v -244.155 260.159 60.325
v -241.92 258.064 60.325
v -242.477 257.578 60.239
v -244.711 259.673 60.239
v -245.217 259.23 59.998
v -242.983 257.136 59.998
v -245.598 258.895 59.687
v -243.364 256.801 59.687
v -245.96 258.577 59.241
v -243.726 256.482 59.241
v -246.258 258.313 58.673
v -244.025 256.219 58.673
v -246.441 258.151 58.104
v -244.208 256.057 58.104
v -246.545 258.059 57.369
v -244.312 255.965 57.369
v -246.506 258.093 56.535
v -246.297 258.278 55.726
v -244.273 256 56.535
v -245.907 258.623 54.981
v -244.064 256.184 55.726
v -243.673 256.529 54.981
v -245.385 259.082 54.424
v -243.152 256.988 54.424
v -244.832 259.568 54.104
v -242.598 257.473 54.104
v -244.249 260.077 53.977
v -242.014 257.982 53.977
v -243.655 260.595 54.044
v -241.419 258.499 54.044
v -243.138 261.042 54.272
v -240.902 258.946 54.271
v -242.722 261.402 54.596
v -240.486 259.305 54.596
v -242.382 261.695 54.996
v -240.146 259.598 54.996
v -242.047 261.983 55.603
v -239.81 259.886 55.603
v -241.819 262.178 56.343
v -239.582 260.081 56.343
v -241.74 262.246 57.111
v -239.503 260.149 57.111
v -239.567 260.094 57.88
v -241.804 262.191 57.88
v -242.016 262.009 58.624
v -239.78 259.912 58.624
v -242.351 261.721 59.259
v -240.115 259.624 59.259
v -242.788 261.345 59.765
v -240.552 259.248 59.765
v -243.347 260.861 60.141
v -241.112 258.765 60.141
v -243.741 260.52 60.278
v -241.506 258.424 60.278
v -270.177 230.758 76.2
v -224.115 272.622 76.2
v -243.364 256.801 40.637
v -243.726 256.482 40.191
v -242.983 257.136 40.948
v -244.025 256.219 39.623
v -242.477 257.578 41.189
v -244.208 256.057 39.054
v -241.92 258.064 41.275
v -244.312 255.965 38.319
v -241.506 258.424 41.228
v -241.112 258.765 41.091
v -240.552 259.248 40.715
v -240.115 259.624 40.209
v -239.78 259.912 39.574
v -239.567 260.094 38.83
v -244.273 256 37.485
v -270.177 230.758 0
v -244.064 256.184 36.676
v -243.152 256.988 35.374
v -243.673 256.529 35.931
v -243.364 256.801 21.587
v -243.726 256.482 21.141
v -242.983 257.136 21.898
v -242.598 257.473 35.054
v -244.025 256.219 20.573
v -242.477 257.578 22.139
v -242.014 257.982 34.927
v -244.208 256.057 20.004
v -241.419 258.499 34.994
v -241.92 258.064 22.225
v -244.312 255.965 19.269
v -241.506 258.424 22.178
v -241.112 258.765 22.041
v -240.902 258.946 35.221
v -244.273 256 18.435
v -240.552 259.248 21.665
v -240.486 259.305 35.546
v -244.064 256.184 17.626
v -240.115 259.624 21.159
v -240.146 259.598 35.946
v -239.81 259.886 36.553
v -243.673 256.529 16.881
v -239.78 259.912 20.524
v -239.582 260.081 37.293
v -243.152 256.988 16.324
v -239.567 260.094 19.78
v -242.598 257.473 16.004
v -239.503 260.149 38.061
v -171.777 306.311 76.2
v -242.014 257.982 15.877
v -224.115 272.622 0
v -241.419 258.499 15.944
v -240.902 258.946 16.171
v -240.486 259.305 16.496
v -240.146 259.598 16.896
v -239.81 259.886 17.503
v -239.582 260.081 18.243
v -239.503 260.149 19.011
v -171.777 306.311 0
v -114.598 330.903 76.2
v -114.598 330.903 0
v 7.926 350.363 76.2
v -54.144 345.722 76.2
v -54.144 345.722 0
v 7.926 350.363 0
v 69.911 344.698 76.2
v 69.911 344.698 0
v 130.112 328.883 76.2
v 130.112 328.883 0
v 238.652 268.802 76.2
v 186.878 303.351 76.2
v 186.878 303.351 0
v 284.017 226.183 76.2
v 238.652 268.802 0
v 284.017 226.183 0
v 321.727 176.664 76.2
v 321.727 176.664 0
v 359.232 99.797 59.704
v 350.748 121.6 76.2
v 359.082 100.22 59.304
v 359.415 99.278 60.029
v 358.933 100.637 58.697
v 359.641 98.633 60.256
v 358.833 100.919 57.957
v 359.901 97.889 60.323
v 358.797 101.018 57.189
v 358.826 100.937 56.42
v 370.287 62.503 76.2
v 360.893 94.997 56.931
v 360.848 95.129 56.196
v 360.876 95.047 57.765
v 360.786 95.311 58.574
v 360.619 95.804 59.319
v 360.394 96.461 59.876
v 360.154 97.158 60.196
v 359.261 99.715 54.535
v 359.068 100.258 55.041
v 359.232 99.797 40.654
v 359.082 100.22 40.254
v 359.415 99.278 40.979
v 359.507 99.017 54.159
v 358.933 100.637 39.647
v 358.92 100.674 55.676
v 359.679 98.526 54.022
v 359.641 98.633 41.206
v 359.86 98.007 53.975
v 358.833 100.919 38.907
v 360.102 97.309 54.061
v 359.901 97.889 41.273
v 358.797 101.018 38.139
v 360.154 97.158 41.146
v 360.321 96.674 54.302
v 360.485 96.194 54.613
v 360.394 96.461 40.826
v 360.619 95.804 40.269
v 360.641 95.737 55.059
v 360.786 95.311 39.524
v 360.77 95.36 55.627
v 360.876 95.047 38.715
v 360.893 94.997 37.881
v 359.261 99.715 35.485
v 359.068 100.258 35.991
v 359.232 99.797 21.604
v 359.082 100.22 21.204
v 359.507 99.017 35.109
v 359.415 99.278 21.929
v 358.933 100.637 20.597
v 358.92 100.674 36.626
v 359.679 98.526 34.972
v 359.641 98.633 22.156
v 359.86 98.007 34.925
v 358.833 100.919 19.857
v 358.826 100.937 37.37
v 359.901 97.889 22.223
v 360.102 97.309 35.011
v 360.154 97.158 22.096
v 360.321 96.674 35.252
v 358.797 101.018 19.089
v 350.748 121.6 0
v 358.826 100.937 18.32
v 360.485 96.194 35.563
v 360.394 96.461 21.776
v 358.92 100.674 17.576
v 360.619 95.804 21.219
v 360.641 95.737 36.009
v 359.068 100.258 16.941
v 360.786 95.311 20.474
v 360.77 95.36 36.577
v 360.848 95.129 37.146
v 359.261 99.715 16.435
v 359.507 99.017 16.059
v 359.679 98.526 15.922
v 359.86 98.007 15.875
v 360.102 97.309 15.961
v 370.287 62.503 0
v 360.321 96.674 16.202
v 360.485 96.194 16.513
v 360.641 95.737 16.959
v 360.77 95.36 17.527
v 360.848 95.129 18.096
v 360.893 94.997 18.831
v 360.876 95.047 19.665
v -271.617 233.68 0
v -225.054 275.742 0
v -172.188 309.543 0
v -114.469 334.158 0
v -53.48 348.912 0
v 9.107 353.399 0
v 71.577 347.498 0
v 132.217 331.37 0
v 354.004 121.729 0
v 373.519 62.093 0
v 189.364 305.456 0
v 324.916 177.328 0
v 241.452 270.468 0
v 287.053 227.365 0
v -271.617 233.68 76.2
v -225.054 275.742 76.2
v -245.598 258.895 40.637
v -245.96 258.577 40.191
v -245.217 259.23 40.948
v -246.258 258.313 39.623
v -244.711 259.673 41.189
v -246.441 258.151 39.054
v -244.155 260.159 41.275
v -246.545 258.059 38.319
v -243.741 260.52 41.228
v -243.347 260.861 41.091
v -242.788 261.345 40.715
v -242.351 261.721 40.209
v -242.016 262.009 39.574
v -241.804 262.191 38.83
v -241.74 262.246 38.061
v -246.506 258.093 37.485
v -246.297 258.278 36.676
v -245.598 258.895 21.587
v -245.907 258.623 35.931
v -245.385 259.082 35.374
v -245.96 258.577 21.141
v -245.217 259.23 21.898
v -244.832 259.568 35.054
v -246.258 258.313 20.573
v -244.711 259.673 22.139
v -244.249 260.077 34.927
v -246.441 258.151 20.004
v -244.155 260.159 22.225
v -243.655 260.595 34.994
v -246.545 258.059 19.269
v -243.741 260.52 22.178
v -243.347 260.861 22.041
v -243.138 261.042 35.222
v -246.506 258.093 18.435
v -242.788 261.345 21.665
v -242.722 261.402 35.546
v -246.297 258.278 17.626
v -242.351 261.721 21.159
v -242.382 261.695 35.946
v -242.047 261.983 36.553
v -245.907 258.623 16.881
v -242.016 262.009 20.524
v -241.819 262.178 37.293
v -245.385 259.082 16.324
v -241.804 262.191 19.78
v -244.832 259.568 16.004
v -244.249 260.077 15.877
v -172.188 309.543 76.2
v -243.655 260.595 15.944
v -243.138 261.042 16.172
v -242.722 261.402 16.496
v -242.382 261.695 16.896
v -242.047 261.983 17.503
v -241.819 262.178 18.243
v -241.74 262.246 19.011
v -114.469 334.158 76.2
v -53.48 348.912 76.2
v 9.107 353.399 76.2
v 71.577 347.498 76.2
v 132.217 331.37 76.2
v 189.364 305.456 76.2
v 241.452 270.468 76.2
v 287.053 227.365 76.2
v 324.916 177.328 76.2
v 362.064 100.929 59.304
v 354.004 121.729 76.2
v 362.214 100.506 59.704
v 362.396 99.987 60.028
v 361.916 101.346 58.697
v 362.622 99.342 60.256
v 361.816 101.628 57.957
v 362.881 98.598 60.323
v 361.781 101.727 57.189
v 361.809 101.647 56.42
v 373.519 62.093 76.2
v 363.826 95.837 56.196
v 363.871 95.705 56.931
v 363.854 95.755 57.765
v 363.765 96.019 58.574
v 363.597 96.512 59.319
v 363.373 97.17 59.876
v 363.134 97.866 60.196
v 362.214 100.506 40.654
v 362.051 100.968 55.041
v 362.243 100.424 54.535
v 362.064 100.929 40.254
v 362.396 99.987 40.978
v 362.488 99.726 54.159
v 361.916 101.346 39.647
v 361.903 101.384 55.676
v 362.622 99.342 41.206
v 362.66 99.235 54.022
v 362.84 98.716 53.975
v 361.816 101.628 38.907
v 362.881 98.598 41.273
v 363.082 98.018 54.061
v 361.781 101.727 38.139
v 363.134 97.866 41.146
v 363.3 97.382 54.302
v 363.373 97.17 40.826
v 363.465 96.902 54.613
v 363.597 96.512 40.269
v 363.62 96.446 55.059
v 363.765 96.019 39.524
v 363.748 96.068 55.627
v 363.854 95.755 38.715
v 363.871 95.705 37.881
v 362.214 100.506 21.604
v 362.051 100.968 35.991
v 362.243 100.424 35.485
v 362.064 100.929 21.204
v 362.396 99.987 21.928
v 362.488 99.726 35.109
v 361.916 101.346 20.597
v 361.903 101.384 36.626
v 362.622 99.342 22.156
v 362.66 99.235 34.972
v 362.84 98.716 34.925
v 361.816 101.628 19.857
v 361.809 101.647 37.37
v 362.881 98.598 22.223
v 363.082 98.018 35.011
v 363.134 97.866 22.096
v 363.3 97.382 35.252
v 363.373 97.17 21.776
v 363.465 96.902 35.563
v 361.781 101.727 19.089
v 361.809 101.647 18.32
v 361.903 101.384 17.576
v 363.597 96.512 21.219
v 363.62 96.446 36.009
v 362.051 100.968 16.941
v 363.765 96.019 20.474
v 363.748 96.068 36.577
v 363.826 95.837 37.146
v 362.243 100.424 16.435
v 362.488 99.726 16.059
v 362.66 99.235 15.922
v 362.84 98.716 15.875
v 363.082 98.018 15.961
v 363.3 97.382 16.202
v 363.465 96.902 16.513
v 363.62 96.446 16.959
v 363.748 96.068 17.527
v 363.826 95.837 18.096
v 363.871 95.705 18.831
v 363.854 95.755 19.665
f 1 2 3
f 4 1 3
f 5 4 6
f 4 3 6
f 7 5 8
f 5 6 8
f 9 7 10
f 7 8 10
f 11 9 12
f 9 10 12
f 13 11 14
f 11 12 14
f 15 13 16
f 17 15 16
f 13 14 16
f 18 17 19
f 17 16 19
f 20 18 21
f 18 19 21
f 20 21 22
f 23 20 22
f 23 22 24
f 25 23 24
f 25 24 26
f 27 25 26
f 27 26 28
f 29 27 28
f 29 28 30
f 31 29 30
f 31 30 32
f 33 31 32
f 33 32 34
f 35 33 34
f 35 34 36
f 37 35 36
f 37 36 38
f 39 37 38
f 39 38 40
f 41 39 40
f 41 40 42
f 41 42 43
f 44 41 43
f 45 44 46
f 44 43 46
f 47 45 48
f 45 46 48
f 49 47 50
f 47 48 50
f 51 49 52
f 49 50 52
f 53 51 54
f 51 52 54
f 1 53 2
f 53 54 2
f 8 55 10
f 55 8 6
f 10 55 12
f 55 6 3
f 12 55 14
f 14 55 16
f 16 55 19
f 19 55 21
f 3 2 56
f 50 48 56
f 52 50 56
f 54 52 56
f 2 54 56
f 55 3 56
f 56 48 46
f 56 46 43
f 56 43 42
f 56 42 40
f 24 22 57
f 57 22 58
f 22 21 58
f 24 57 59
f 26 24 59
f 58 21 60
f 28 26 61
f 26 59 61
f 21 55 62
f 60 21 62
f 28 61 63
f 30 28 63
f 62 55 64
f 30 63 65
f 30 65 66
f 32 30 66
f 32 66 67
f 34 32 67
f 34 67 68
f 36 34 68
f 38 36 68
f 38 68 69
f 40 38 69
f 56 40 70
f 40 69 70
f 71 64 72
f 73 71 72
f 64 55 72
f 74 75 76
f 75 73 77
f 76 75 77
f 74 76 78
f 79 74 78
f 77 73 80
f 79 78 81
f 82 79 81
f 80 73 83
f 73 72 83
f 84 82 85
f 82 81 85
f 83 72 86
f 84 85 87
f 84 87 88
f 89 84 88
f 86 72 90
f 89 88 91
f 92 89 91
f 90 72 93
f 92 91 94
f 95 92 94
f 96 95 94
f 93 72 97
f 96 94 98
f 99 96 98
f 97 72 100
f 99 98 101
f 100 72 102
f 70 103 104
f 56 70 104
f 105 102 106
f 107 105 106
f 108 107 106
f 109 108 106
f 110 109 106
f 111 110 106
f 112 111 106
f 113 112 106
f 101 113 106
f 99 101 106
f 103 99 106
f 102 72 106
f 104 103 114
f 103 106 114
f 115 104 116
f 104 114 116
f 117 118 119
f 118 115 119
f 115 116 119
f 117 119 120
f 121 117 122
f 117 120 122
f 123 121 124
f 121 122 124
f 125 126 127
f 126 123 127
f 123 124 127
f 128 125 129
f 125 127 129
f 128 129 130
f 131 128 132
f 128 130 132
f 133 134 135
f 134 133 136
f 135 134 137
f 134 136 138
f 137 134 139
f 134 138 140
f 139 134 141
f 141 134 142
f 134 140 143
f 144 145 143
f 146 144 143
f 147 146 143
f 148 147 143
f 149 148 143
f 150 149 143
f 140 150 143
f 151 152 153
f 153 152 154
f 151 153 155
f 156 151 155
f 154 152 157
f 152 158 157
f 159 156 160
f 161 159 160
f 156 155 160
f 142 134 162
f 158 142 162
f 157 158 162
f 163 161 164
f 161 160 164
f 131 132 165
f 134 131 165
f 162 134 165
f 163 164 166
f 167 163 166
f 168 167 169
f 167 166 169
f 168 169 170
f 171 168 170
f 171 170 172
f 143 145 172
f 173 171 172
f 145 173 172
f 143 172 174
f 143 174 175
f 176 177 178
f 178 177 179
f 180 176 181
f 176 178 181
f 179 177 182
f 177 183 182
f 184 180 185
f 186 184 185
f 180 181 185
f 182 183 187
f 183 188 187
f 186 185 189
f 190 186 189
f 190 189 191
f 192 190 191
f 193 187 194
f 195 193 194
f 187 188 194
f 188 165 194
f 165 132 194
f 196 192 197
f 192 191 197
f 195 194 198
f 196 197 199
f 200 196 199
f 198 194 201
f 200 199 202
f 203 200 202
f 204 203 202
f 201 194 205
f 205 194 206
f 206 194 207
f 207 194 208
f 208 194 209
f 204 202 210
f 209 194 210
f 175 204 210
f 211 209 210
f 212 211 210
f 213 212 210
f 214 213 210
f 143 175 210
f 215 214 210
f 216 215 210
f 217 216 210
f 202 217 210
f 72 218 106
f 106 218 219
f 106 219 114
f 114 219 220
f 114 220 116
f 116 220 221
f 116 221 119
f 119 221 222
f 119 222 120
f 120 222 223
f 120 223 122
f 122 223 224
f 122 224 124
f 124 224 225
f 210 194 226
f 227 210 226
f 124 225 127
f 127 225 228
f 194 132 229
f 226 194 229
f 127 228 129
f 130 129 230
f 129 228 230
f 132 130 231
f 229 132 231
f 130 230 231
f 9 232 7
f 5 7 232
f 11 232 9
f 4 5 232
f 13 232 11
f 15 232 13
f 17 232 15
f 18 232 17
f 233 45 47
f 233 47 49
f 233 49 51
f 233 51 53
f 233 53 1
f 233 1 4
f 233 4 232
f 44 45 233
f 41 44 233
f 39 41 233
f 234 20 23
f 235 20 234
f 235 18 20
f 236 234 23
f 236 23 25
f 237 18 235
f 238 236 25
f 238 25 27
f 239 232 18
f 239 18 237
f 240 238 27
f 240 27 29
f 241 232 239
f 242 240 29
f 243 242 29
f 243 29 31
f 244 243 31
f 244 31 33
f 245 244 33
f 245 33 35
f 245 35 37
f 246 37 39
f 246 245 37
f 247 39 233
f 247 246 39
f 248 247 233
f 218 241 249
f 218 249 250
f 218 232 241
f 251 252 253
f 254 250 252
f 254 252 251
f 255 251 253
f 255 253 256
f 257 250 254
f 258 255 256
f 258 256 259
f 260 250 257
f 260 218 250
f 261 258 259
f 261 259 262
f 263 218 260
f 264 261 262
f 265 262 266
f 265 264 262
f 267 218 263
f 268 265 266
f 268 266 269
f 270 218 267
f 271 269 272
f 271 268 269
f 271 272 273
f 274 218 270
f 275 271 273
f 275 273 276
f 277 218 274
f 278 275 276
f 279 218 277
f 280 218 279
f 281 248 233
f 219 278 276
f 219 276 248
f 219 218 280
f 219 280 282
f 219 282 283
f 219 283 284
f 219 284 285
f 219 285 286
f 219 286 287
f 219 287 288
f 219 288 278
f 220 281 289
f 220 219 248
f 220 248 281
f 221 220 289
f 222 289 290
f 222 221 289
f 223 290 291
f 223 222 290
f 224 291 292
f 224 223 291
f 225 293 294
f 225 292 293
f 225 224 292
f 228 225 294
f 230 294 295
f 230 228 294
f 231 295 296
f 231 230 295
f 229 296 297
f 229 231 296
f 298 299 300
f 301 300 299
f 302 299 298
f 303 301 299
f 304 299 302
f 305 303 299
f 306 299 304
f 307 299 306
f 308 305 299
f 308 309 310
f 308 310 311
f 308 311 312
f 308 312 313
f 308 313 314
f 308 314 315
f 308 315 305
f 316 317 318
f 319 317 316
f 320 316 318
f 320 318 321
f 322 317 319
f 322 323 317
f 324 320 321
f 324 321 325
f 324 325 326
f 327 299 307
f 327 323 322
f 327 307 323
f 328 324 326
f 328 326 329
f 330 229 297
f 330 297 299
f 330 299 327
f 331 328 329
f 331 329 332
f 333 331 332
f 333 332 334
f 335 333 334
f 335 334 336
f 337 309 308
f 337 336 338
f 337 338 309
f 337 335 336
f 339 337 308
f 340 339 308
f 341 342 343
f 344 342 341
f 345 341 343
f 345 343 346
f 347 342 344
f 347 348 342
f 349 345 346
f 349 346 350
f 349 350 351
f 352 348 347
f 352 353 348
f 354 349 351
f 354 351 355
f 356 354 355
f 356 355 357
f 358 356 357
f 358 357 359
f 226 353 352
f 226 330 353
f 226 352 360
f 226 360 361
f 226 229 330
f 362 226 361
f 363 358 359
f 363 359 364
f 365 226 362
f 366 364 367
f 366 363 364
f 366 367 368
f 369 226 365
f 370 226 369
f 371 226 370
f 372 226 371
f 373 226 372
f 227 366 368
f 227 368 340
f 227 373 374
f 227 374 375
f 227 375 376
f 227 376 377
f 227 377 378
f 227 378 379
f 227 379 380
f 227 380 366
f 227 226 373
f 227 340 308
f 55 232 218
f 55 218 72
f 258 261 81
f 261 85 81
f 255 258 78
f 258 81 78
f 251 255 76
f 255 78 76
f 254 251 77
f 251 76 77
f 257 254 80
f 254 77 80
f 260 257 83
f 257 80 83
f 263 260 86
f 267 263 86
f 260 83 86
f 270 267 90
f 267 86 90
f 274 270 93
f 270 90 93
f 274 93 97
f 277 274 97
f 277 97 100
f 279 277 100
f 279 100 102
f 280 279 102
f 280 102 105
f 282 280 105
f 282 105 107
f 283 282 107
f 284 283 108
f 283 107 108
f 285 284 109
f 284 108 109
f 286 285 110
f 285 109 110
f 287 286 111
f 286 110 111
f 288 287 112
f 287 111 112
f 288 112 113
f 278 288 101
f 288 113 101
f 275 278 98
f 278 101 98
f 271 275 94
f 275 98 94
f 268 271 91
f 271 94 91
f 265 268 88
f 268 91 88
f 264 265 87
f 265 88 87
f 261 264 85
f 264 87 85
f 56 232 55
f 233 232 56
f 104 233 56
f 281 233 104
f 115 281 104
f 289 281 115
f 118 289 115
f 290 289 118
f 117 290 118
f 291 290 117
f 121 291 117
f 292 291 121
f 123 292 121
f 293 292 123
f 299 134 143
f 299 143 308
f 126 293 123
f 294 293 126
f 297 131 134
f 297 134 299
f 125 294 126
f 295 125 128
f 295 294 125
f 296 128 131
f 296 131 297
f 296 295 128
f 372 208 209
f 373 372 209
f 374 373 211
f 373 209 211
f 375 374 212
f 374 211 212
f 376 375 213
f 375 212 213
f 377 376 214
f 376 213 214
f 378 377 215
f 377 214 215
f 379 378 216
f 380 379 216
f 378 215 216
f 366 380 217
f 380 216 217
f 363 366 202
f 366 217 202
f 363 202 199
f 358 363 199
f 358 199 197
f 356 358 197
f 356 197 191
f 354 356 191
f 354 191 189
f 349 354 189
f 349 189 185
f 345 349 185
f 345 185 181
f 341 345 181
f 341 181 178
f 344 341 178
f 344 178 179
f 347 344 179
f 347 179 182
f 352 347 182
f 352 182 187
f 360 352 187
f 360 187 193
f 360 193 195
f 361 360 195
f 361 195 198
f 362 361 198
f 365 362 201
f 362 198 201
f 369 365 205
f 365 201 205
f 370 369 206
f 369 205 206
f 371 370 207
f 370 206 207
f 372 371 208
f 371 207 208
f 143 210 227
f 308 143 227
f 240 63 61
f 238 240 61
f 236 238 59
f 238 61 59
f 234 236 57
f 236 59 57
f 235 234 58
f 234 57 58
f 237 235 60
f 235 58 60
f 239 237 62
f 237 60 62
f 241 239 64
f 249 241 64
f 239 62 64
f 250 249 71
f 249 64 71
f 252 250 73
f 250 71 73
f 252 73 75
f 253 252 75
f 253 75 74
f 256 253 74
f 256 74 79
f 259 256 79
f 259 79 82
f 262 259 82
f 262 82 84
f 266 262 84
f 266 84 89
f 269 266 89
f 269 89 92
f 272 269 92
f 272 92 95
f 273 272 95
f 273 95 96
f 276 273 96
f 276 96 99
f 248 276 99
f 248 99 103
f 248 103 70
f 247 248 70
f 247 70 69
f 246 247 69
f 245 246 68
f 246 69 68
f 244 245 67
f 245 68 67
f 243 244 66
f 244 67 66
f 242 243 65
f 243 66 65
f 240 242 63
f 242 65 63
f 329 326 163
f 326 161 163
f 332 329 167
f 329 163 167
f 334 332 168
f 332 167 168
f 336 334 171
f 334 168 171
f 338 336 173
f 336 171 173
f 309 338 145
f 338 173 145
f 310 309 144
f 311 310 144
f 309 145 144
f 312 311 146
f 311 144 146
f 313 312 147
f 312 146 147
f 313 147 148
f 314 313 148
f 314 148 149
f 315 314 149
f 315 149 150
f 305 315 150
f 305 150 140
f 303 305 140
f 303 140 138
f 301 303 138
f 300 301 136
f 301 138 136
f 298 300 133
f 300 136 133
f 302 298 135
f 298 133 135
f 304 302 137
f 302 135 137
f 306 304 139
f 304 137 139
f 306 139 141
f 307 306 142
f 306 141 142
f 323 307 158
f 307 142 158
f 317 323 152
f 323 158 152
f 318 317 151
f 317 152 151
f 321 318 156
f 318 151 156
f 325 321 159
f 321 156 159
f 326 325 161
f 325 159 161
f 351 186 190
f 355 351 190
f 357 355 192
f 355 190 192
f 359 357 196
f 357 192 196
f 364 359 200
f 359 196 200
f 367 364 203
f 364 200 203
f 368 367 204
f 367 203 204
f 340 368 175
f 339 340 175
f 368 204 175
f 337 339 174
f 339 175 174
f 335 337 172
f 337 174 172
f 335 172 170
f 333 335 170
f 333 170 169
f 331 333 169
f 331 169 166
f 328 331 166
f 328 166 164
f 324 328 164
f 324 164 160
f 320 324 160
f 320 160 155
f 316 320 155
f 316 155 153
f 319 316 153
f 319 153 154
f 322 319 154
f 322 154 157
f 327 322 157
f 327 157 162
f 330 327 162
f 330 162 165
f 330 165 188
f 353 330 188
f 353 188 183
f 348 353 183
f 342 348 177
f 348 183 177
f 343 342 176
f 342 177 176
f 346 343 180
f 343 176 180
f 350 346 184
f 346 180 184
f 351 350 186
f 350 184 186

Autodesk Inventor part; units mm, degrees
ref_plane "YZ Plane" through (0, 0, 0) normal (1, 0, 0) x (0, 1, 0)
sketch "Sketch1" plane through (0, 0, 0) normal (0, 0, 1) x (1, 0, 0)
  arc A0 (370.2866, 62.5027) -> (-270.1768, 230.7579) centre (4.8231, -25.5444) ccw
  arc A1 (373.5188, 62.0926) -> (-271.6172, 233.6803) centre (4.8231, -25.5444) ccw
  line L0 (-271.6172, 233.6803) -> (-270.1768, 230.7579)
  line L1 (370.2866, 62.5027) -> (373.5188, 62.0926)
  point P0 (0, 0)
  dimension "d0" = 375.92
  dimension "d1" = 123.47
  dimension "d3" = 123.47
  dimension "d4" = 378.968
extrude "Extrusion1" add sketch "Sketch1" along normal blind 76.2
ref_plane "Work Plane3" through (373.5188, 62.0926, 0) normal (0.9729, 0.2313, 0) x (-0.2313, 0.9729, 0)
ref_plane "Work Plane4" through (-271.6172, 233.6803, 0) normal (-0.7295, 0.684, 0) x (-0.684, -0.7295, 0)
sketch "Sketch2" plane through (373.5188, 62.0926, 0) normal (0.9729, 0.2313, 0) x (-0.2313, 0.9729, 0)
  line L0 (316.1255, 76.2) -> (0, 76.2) projected
  line L1 (0, 0) -> (0, 76.2) projected
  line L2 (316.1255, 0) -> (0, 0) projected
  line L3 (316.1255, 0) -> (316.1255, 76.2) projected
  point P0 (25.9674, 0)
  point P1 (38.1, 57.15)
  point P2 (38.1, 38.1)
  point P3 (38.1, 19.05)
  dimension "d7" = 38.1
  dimension "d8" = 38.1
  dimension "d9" = 38.1
  dimension "d10" = 19.05
  dimension "d11" = 38.1
  dimension "d12" = 57.15
sketch "Sketch3" plane through (-271.6172, 233.6803, 0) normal (-0.7295, 0.684, 0) x (-0.684, -0.7295, 0)
  line L0 (0, 0) -> (0, 76.2) projected
  line L1 (-378.968, 0) -> (0, 0) projected
  point P0 (-15.3344, 0)
  point P1 (-38.1, 19.05)
  point P2 (-38.1, 38.1)
  point P3 (-38.1, 57.15)
  point P4 (-316.1255, 0)
  dimension "d13" = 38.1
  dimension "d14" = 38.1
  dimension "d15" = 38.1
  dimension "d16" = 19.05
  dimension "d17" = 38.1
  dimension "d18" = 57.15
hole "Hole1" at (-245.5557, 261.4726, 57.15) at (-245.5557, 261.4726, 38.1) at (-245.5557, 261.4726, 19.05) direction (0.7295, -0.684, 0) diameter 6.35 depth 25.4 tip angle 118
hole "Hole2" at (364.7081, 99.1598, 57.15) at (364.7081, 99.1598, 38.1) at (364.7081, 99.1598, 19.05) direction (-0.9729, -0.2313, 0) diameter 6.35 depth 25.4 tip angle 118
thread "Thread7" size "1/4-20 UNC" class "2B" standard "ANSI Unified Screw Threads" full length
thread "Thread8" size "1/4-20 UNC" class "2B" standard "ANSI Unified Screw Threads" full length
thread "Thread9" size "1/4-20 UNC" class "2B" standard "ANSI Unified Screw Threads" full length
thread "Thread10" size "1/4-20 UNC" class "2B" standard "ANSI Unified Screw Threads" full length
thread "Thread11" size "1/4-20 UNC" class "2B" standard "ANSI Unified Screw Threads" full length
thread "Thread12" size "1/4-20 UNC" class "2B" standard "ANSI Unified Screw Threads" full length
equation "\"d3\" = d1"
properties part number "curvedTrack 123.47 degrees"
